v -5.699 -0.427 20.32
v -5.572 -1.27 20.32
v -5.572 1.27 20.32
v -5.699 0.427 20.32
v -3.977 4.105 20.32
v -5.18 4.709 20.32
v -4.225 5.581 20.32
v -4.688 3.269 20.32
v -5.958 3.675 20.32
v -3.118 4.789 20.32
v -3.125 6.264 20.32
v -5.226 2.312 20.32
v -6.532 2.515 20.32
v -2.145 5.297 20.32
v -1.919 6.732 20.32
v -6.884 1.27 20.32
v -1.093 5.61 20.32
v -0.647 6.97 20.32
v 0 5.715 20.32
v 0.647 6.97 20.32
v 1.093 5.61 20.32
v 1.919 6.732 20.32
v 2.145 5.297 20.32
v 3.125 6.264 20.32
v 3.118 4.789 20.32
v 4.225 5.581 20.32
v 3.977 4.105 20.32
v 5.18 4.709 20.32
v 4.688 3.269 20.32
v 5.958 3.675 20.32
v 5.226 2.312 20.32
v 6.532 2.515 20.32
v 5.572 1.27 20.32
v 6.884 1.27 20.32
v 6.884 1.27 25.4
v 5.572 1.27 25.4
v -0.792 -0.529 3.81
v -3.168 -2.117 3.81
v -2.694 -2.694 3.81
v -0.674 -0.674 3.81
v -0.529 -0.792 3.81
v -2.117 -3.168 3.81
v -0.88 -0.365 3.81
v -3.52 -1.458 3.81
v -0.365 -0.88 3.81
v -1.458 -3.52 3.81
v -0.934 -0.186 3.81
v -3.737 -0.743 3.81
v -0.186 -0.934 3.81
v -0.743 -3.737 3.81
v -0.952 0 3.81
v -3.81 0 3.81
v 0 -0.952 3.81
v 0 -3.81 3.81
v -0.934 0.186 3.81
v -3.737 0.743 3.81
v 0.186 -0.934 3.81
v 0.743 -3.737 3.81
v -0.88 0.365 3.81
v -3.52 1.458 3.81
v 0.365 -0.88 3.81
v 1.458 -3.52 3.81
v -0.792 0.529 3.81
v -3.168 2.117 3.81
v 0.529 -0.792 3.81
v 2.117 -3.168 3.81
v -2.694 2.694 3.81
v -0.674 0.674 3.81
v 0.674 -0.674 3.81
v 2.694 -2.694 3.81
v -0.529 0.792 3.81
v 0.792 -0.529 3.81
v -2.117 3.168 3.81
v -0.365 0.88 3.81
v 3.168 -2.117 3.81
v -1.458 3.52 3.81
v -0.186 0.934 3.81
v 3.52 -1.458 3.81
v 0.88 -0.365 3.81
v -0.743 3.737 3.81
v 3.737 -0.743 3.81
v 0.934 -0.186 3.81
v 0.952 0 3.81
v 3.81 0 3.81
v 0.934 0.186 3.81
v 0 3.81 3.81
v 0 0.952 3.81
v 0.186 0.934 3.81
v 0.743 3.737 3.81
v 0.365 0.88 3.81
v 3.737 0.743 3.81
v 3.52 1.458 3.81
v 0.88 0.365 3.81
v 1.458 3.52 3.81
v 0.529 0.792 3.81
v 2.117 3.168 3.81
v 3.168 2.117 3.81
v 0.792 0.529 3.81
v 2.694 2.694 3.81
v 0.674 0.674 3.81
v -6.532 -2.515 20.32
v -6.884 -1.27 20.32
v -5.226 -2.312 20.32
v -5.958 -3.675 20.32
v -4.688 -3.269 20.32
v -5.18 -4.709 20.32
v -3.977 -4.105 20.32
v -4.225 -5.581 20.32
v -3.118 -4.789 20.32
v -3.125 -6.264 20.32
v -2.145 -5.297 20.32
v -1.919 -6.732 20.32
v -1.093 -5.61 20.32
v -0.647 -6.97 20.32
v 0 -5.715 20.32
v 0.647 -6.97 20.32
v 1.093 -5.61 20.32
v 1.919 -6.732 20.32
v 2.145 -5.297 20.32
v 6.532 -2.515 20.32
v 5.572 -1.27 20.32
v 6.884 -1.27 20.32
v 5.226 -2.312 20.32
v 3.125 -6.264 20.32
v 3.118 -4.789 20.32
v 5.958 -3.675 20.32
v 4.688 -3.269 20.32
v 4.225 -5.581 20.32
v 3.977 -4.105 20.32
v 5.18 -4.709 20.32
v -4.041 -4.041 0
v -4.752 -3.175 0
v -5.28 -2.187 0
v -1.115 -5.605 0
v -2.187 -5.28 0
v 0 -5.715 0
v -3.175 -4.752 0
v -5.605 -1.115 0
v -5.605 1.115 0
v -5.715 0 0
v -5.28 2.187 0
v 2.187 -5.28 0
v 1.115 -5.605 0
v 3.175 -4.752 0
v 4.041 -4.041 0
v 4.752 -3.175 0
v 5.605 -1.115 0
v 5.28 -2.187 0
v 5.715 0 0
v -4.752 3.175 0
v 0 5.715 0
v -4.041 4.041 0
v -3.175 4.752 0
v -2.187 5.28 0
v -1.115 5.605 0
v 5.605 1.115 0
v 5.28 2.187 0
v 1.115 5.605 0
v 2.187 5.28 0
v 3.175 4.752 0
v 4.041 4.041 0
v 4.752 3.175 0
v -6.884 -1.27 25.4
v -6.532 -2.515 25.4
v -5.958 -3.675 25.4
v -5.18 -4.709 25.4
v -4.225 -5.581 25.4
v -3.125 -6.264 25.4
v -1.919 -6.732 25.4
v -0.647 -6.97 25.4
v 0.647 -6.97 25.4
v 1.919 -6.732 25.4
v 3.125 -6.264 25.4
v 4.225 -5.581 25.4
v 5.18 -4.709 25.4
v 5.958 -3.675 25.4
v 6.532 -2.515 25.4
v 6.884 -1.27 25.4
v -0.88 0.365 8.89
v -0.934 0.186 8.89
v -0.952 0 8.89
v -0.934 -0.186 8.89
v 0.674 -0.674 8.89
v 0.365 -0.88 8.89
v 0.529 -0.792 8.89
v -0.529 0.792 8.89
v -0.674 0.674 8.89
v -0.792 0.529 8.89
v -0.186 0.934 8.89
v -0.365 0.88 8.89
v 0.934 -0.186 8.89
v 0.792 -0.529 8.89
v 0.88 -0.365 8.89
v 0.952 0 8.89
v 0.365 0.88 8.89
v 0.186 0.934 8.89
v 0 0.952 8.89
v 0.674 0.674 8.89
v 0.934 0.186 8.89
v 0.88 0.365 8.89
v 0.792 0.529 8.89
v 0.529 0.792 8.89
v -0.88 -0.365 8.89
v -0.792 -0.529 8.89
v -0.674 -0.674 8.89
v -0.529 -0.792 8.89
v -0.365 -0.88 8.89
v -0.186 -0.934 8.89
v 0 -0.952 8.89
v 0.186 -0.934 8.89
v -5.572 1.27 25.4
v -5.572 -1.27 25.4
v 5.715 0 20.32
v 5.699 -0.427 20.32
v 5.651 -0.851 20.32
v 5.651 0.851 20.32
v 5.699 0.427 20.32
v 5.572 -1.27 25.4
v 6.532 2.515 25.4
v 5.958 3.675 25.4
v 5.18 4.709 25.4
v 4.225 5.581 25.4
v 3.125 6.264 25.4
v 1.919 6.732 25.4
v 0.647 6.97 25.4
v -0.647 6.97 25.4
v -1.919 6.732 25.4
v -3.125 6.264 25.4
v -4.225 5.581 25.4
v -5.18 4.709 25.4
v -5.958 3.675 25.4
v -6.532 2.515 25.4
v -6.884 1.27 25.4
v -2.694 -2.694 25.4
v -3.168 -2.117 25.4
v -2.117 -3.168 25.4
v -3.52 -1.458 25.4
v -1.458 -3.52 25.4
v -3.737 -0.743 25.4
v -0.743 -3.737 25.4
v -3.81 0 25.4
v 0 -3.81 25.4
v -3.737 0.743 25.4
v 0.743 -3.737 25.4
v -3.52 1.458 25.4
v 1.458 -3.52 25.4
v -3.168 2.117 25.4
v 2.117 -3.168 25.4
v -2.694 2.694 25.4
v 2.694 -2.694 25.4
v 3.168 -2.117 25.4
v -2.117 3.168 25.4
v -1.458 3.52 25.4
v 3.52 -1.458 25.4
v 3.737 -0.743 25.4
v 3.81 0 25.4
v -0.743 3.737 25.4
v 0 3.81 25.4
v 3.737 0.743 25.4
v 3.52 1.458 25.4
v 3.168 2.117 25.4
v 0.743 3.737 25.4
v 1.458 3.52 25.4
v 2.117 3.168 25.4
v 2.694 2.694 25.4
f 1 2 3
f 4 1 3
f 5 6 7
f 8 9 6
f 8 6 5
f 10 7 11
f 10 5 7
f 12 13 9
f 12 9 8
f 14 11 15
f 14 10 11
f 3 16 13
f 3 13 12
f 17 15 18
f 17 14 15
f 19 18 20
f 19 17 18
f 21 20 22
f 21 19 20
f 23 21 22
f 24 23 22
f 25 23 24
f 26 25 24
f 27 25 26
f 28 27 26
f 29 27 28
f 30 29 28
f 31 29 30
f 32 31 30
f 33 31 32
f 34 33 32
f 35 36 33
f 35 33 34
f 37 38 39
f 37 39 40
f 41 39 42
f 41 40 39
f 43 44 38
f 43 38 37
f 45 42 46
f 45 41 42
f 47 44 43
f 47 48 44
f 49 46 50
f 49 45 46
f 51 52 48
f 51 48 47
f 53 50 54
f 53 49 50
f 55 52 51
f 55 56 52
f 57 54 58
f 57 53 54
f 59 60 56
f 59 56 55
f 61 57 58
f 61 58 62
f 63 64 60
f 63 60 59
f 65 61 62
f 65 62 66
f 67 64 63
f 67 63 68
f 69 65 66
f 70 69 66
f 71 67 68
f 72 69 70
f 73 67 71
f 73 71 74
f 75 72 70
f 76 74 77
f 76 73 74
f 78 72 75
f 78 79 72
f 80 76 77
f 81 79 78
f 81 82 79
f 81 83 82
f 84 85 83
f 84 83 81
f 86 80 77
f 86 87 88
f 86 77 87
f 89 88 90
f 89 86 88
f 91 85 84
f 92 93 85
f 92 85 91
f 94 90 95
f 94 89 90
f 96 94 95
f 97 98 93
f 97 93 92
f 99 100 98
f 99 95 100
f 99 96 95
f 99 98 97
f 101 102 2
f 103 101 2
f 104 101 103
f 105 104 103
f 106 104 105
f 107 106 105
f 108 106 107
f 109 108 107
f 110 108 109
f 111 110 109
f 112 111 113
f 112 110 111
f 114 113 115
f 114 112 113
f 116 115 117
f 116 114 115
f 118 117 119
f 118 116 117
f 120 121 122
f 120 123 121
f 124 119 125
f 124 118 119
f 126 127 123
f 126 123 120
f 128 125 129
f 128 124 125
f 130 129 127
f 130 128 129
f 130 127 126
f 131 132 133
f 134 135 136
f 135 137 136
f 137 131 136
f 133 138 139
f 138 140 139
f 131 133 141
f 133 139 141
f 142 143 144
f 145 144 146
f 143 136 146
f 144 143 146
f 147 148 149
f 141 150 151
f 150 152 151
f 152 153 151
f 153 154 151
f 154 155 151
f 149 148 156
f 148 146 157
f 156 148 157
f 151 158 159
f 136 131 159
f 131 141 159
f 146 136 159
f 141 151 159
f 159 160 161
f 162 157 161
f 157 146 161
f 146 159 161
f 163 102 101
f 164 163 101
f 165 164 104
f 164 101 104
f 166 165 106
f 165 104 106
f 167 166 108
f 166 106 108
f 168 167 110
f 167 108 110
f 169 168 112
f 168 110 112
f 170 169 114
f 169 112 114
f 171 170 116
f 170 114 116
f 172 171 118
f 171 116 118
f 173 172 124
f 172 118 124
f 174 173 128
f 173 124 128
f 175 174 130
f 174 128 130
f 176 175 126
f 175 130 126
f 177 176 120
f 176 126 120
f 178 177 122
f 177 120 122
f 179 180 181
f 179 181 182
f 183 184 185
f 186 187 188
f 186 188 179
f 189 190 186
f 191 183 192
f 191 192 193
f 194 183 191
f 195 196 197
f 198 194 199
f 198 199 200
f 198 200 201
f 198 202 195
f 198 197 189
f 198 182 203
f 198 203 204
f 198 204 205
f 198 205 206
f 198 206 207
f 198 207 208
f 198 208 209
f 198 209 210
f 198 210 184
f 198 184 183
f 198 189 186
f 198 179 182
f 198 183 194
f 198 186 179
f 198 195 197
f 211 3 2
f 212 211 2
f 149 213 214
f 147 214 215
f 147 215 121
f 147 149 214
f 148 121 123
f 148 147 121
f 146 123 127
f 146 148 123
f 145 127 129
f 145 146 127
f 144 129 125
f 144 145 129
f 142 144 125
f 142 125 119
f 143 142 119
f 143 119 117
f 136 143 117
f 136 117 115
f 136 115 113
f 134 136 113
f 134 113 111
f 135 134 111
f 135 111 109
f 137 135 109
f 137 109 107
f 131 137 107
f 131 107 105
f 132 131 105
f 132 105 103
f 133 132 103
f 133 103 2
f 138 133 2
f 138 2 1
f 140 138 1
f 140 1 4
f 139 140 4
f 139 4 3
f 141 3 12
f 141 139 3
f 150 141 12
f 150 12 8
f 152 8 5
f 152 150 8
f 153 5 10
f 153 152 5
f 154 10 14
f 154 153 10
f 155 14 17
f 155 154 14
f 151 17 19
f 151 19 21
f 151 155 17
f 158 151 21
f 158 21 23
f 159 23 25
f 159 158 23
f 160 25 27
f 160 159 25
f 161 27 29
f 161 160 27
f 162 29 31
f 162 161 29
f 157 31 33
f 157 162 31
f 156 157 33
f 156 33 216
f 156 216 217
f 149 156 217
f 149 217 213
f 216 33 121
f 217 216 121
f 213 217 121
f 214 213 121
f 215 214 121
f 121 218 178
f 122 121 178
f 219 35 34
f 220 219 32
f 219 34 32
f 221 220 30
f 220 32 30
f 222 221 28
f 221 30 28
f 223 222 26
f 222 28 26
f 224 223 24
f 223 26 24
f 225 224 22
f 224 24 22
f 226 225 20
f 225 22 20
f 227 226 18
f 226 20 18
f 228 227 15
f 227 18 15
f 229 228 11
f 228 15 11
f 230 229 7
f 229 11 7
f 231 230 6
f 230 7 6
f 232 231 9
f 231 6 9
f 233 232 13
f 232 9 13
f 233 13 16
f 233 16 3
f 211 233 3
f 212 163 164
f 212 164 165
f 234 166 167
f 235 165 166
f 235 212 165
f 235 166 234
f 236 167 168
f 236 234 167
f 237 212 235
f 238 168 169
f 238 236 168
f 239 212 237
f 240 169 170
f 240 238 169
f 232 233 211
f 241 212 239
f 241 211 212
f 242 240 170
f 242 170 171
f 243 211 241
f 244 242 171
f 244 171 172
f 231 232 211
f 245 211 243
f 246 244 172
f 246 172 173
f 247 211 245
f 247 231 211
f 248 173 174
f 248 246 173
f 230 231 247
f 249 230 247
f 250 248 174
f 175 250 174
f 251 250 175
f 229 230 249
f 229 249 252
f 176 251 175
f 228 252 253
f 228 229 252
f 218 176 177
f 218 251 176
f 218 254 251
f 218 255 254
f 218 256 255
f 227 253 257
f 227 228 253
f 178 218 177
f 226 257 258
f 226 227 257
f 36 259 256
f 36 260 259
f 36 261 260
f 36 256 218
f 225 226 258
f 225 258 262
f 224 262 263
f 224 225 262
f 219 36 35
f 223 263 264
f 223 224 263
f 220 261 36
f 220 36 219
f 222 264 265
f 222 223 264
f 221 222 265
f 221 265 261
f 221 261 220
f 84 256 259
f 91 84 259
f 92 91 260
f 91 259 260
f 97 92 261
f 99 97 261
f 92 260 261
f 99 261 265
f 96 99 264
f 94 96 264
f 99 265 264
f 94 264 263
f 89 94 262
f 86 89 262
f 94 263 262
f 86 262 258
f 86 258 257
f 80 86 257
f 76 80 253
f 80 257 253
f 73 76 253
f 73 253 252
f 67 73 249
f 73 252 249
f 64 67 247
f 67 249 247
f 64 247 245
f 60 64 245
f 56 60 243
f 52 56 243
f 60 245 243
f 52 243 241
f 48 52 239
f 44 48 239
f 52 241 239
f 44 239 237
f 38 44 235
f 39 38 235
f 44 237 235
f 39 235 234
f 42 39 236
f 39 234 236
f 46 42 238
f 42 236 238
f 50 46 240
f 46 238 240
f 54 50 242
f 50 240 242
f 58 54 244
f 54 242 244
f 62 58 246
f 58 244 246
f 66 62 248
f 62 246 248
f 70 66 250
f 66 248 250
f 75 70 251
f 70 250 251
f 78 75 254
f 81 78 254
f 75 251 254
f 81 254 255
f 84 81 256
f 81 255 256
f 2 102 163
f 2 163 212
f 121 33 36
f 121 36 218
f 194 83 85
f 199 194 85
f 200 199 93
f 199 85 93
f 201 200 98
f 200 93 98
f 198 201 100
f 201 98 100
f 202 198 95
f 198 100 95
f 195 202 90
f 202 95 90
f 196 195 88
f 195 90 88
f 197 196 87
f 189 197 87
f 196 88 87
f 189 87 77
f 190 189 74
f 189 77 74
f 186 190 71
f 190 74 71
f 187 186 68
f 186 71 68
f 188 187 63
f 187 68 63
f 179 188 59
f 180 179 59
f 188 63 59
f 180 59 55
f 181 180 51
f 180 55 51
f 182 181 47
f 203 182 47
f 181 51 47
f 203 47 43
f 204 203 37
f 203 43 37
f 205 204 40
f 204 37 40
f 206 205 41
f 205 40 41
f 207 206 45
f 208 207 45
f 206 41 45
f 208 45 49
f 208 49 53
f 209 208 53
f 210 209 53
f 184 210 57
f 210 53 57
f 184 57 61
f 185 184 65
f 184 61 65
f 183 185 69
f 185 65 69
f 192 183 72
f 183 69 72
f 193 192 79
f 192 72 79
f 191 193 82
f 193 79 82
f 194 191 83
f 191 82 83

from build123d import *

# Parameters (mm, degrees)
F0_R     = 7
F1_DEPTH = 25.4
F2_R     = 3.81
F3_DEPTH = 21.59
F4_R     = 7
F4_R_2   = 5.715
F5_DEPTH = 20.32
F6_W     = 2.794
F6_H     = 2.54
F7_DEPTH = 25.4
F8_R     = 0.9525
F9_DEPTH = 5.08


with BuildPart() as f1:
    # F0 (on Top) → F1 (new body)
    with BuildSketch(Plane.XY):
        Circle(F0_R)
    extrude(amount=F1_DEPTH)

    # F2 (on face) → F3 (cut)
    with BuildSketch(Plane.XY.offset(25.4)):
        Circle(F2_R)
    extrude(amount=-F3_DEPTH, mode=Mode.SUBTRACT)

    # F4 (on face) → F5 (cut)
    with BuildSketch(Plane(origin=(0, 0, 0), x_dir=(1, 0, 0), z_dir=(0, 0, -1))):
        Circle(F4_R)
        Circle(F4_R_2, mode=Mode.SUBTRACT)
    extrude(amount=-F5_DEPTH, mode=Mode.SUBTRACT)

    # F6 (on face) → F7 (cut)
    with BuildSketch(Plane(origin=(0, 0, 20.32), x_dir=(1, 0, 0), z_dir=(0, 0, -1))):
        with Locations((6.969102, 0)):
            Rectangle(F6_W, F6_H)
        with Locations((-6.969102, 0)):
            Rectangle(F6_W, F6_H)
    extrude(amount=-F7_DEPTH, mode=Mode.SUBTRACT)

    # F8 (on face) → F9 (join)
    with BuildSketch(Plane.XY.offset(3.81)):
        Circle(F8_R)
    extrude(amount=F9_DEPTH)


solid = f1.part
